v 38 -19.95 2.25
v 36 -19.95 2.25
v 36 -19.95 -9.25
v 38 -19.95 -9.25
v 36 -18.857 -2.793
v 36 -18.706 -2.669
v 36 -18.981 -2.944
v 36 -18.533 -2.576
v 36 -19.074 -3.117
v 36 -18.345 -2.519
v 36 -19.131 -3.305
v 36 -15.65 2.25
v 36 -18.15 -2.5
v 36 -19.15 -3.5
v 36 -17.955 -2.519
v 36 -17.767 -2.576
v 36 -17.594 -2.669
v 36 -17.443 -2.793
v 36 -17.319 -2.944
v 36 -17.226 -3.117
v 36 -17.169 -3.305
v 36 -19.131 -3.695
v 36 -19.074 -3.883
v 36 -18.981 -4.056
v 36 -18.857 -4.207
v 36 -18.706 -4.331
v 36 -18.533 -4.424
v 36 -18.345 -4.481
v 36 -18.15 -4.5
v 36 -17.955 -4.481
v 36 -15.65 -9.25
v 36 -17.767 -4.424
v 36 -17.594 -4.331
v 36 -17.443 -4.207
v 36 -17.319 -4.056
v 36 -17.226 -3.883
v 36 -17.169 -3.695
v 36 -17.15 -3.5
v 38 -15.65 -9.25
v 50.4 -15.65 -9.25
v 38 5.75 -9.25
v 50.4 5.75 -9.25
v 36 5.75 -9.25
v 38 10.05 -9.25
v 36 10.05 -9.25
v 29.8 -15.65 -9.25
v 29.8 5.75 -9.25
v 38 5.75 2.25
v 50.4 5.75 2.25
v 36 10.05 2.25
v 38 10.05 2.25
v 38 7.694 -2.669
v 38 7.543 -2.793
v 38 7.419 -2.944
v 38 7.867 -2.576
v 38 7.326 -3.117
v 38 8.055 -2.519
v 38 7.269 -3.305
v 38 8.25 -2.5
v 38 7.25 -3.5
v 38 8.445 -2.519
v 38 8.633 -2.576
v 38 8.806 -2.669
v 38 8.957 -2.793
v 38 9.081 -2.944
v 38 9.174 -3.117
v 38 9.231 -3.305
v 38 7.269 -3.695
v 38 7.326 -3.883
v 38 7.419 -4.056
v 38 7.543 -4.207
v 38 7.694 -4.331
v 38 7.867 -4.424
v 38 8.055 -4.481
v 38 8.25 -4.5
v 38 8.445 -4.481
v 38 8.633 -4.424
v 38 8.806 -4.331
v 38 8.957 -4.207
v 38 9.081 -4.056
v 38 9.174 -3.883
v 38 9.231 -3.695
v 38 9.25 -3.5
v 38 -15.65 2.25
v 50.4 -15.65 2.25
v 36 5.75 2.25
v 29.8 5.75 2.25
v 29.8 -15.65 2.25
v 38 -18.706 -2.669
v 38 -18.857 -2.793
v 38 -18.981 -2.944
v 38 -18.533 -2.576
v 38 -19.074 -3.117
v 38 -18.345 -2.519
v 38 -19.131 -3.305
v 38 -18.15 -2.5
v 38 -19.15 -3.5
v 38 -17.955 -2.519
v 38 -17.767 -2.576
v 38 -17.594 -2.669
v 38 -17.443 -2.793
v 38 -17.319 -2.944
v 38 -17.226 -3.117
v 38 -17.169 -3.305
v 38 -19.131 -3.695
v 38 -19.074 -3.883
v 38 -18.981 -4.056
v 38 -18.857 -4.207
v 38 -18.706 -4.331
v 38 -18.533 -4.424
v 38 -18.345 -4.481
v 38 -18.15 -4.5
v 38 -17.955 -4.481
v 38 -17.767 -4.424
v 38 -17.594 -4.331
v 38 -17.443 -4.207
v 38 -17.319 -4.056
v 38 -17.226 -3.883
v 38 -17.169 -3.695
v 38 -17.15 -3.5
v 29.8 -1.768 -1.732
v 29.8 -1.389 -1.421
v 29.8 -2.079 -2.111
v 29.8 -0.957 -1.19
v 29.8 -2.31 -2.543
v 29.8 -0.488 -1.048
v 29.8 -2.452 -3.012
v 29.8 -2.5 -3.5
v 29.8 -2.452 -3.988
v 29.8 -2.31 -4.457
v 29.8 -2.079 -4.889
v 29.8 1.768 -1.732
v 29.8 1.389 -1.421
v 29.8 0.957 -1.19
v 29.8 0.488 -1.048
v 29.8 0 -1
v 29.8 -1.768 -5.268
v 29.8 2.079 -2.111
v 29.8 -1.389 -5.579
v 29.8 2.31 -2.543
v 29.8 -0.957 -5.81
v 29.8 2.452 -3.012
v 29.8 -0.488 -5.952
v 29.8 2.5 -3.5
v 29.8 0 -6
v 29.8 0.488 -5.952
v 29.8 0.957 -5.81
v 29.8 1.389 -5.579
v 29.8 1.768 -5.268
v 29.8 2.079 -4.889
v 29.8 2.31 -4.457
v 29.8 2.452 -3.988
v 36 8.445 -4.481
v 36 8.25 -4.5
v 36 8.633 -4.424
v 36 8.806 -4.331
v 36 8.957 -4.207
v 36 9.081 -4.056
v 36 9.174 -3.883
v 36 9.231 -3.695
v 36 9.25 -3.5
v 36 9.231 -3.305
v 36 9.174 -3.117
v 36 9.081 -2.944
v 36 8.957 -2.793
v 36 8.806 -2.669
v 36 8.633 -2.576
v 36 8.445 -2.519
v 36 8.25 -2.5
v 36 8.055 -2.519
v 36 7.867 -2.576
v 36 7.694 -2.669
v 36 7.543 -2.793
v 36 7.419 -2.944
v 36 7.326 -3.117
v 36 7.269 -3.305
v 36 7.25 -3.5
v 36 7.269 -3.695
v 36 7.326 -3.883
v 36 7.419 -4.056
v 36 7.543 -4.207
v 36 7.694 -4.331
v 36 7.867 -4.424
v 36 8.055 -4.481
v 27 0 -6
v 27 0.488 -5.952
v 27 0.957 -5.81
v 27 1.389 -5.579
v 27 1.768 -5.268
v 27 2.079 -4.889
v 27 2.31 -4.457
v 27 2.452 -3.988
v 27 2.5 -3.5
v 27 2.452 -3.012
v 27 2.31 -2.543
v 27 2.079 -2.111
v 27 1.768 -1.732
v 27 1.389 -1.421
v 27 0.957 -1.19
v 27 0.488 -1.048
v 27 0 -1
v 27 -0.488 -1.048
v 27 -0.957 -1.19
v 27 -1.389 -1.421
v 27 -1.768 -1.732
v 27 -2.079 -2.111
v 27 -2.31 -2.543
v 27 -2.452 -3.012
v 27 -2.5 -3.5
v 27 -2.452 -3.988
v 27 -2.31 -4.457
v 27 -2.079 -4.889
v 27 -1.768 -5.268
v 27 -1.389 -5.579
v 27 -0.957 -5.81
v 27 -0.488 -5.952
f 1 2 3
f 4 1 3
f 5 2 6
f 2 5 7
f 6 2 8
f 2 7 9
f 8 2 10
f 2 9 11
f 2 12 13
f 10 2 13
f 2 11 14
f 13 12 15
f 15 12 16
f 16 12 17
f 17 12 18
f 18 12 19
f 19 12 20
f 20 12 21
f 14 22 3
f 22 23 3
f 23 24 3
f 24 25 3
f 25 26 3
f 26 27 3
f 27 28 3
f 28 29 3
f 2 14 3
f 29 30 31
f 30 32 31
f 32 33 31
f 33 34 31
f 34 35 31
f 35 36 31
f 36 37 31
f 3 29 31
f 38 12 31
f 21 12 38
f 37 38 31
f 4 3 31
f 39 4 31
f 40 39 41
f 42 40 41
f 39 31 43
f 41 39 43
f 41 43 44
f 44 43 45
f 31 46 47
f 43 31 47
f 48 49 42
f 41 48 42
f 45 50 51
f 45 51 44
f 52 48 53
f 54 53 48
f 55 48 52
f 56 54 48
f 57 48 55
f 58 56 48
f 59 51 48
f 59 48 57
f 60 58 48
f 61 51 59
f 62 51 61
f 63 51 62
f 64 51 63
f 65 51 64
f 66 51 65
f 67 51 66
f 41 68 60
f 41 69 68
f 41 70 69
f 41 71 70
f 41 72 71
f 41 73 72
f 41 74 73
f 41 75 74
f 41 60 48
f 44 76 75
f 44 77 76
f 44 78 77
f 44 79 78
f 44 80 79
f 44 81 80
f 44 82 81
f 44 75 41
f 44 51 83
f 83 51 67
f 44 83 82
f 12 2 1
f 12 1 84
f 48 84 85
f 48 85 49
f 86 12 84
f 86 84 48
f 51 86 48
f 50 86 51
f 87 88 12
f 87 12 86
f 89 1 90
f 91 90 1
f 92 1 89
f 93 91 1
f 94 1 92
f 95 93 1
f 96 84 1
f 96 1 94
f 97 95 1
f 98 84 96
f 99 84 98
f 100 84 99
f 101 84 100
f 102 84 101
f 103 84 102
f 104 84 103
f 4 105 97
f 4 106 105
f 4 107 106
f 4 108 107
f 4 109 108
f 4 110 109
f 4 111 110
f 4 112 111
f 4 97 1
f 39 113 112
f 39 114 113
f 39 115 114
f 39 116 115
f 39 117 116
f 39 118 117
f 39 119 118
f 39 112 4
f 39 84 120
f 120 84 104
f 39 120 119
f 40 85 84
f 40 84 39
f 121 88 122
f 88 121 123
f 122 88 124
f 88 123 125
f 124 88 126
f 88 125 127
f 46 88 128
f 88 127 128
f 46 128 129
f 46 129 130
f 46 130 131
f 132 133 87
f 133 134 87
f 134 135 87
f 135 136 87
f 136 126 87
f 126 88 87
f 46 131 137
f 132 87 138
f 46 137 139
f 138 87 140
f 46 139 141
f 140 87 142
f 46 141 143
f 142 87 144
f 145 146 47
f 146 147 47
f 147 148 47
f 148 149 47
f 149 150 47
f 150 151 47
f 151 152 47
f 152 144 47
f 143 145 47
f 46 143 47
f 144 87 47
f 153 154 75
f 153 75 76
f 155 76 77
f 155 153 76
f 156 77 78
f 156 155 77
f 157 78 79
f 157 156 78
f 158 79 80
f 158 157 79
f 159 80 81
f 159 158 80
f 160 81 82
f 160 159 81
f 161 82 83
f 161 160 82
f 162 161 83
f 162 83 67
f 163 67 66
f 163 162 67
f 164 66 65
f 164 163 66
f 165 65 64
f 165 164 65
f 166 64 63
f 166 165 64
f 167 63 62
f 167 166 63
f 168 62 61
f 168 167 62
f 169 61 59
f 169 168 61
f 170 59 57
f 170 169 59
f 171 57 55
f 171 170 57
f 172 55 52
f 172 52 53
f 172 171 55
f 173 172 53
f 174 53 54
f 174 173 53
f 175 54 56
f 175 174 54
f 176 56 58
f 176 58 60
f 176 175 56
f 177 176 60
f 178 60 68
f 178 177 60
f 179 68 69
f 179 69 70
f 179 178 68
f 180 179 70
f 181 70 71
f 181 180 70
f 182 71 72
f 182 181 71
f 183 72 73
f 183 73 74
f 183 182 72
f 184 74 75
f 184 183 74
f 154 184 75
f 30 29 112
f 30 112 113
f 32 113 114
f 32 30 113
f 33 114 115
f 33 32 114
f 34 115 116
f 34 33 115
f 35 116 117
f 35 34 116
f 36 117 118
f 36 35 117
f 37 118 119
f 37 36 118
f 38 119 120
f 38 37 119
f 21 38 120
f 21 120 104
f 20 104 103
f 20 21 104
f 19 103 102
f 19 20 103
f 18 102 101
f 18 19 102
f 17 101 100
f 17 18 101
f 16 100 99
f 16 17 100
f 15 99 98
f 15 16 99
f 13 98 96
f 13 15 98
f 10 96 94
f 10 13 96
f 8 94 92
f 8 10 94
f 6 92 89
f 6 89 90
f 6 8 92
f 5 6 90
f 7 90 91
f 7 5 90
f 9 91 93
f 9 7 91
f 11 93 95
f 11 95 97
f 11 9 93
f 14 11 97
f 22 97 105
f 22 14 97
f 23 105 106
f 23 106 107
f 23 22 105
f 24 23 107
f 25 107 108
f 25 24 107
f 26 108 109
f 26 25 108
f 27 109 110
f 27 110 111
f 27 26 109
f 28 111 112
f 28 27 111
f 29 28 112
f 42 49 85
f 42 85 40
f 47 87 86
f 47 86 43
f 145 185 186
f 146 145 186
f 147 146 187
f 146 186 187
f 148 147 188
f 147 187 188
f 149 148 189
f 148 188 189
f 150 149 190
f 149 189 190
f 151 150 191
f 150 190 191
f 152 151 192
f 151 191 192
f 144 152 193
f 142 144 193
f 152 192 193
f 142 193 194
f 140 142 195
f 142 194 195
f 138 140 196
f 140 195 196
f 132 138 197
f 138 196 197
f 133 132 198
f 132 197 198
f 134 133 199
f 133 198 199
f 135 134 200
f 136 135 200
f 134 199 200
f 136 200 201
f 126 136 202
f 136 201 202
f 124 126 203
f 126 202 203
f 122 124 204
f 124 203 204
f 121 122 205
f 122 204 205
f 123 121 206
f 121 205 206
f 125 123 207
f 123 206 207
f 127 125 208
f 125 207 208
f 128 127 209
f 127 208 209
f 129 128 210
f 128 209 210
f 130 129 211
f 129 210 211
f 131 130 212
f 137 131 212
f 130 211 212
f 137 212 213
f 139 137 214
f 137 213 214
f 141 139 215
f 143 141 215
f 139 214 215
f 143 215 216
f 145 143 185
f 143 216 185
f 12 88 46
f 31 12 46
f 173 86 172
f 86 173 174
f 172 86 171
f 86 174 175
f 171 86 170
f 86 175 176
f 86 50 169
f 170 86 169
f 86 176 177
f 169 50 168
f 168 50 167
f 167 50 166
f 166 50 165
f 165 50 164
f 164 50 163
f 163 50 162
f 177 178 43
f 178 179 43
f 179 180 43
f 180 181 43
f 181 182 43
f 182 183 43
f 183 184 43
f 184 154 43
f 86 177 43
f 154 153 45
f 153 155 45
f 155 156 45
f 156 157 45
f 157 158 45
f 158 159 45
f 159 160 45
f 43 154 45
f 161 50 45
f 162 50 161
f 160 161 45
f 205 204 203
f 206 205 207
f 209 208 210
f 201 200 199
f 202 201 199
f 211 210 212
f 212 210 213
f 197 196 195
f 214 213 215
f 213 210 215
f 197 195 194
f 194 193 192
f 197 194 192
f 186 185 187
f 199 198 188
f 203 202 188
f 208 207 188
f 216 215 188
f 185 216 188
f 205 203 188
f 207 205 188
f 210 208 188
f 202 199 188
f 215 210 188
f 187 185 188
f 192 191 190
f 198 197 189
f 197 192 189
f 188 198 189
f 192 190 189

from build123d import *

# Parameters (mm, degrees)
EXTRUDE_START                = 29.8
SKETCH_1_W                   = 11.5
SKETCH_1_H                   = 21.4
EXTRUDE_21_4X11_5_20_6_DEPTH = 20.6
EXTRUDE_START_2              = 36
SKETCH_2_W                   = 11.5
SKETCH_2_H                   = 30
SKETCH_2_R                   = 1
EXTRUDE_30_26_4_2_2_DEPTH    = 2
EXTRUDE_START_3              = 27
SKETCH_3_R                   = 2.5
EXTRUDE_5_2_8_DEPTH          = 2.8


with BuildPart() as part:
    # 草图1 → 机身21.4x11.5_总高20.6 (new body)
    with BuildSketch(Plane(origin=(0, 0, 0), x_dir=(0, 0, -1), z_dir=(1, 0, 0)).offset(EXTRUDE_START)):
        with Locations((3.5, -4.95)):
            Rectangle(SKETCH_1_W, SKETCH_1_H)
    extrude(amount=EXTRUDE_21_4X11_5_20_6_DEPTH)

    # 草图2 → 安装耳30_孔距26.4_孔径2_耳厚暂定2 (add)
    with BuildSketch(Plane(origin=(0, 0, 0), x_dir=(0, 0, -1), z_dir=(1, 0, 0)).offset(EXTRUDE_START_2)):
        with Locations((3.5, -4.95)):
            Rectangle(SKETCH_2_W, SKETCH_2_H)
        with Locations((3.5, -18.15)):
            Circle(SKETCH_2_R, mode=Mode.SUBTRACT)
        with Locations((3.5, 8.25)):
            Circle(SKETCH_2_R, mode=Mode.SUBTRACT)
    extrude(amount=EXTRUDE_30_26_4_2_2_DEPTH)

    # 草图3 → 输出齿轴简化_直径5高2.8待实测 (add)
    with BuildSketch(Plane(origin=(0, 0, 0), x_dir=(0, 0, -1), z_dir=(1, 0, 0)).offset(EXTRUDE_START_3)):
        with Locations((3.5, 0)):
            Circle(SKETCH_3_R)
    extrude(amount=EXTRUDE_5_2_8_DEPTH)


solid = part.part
